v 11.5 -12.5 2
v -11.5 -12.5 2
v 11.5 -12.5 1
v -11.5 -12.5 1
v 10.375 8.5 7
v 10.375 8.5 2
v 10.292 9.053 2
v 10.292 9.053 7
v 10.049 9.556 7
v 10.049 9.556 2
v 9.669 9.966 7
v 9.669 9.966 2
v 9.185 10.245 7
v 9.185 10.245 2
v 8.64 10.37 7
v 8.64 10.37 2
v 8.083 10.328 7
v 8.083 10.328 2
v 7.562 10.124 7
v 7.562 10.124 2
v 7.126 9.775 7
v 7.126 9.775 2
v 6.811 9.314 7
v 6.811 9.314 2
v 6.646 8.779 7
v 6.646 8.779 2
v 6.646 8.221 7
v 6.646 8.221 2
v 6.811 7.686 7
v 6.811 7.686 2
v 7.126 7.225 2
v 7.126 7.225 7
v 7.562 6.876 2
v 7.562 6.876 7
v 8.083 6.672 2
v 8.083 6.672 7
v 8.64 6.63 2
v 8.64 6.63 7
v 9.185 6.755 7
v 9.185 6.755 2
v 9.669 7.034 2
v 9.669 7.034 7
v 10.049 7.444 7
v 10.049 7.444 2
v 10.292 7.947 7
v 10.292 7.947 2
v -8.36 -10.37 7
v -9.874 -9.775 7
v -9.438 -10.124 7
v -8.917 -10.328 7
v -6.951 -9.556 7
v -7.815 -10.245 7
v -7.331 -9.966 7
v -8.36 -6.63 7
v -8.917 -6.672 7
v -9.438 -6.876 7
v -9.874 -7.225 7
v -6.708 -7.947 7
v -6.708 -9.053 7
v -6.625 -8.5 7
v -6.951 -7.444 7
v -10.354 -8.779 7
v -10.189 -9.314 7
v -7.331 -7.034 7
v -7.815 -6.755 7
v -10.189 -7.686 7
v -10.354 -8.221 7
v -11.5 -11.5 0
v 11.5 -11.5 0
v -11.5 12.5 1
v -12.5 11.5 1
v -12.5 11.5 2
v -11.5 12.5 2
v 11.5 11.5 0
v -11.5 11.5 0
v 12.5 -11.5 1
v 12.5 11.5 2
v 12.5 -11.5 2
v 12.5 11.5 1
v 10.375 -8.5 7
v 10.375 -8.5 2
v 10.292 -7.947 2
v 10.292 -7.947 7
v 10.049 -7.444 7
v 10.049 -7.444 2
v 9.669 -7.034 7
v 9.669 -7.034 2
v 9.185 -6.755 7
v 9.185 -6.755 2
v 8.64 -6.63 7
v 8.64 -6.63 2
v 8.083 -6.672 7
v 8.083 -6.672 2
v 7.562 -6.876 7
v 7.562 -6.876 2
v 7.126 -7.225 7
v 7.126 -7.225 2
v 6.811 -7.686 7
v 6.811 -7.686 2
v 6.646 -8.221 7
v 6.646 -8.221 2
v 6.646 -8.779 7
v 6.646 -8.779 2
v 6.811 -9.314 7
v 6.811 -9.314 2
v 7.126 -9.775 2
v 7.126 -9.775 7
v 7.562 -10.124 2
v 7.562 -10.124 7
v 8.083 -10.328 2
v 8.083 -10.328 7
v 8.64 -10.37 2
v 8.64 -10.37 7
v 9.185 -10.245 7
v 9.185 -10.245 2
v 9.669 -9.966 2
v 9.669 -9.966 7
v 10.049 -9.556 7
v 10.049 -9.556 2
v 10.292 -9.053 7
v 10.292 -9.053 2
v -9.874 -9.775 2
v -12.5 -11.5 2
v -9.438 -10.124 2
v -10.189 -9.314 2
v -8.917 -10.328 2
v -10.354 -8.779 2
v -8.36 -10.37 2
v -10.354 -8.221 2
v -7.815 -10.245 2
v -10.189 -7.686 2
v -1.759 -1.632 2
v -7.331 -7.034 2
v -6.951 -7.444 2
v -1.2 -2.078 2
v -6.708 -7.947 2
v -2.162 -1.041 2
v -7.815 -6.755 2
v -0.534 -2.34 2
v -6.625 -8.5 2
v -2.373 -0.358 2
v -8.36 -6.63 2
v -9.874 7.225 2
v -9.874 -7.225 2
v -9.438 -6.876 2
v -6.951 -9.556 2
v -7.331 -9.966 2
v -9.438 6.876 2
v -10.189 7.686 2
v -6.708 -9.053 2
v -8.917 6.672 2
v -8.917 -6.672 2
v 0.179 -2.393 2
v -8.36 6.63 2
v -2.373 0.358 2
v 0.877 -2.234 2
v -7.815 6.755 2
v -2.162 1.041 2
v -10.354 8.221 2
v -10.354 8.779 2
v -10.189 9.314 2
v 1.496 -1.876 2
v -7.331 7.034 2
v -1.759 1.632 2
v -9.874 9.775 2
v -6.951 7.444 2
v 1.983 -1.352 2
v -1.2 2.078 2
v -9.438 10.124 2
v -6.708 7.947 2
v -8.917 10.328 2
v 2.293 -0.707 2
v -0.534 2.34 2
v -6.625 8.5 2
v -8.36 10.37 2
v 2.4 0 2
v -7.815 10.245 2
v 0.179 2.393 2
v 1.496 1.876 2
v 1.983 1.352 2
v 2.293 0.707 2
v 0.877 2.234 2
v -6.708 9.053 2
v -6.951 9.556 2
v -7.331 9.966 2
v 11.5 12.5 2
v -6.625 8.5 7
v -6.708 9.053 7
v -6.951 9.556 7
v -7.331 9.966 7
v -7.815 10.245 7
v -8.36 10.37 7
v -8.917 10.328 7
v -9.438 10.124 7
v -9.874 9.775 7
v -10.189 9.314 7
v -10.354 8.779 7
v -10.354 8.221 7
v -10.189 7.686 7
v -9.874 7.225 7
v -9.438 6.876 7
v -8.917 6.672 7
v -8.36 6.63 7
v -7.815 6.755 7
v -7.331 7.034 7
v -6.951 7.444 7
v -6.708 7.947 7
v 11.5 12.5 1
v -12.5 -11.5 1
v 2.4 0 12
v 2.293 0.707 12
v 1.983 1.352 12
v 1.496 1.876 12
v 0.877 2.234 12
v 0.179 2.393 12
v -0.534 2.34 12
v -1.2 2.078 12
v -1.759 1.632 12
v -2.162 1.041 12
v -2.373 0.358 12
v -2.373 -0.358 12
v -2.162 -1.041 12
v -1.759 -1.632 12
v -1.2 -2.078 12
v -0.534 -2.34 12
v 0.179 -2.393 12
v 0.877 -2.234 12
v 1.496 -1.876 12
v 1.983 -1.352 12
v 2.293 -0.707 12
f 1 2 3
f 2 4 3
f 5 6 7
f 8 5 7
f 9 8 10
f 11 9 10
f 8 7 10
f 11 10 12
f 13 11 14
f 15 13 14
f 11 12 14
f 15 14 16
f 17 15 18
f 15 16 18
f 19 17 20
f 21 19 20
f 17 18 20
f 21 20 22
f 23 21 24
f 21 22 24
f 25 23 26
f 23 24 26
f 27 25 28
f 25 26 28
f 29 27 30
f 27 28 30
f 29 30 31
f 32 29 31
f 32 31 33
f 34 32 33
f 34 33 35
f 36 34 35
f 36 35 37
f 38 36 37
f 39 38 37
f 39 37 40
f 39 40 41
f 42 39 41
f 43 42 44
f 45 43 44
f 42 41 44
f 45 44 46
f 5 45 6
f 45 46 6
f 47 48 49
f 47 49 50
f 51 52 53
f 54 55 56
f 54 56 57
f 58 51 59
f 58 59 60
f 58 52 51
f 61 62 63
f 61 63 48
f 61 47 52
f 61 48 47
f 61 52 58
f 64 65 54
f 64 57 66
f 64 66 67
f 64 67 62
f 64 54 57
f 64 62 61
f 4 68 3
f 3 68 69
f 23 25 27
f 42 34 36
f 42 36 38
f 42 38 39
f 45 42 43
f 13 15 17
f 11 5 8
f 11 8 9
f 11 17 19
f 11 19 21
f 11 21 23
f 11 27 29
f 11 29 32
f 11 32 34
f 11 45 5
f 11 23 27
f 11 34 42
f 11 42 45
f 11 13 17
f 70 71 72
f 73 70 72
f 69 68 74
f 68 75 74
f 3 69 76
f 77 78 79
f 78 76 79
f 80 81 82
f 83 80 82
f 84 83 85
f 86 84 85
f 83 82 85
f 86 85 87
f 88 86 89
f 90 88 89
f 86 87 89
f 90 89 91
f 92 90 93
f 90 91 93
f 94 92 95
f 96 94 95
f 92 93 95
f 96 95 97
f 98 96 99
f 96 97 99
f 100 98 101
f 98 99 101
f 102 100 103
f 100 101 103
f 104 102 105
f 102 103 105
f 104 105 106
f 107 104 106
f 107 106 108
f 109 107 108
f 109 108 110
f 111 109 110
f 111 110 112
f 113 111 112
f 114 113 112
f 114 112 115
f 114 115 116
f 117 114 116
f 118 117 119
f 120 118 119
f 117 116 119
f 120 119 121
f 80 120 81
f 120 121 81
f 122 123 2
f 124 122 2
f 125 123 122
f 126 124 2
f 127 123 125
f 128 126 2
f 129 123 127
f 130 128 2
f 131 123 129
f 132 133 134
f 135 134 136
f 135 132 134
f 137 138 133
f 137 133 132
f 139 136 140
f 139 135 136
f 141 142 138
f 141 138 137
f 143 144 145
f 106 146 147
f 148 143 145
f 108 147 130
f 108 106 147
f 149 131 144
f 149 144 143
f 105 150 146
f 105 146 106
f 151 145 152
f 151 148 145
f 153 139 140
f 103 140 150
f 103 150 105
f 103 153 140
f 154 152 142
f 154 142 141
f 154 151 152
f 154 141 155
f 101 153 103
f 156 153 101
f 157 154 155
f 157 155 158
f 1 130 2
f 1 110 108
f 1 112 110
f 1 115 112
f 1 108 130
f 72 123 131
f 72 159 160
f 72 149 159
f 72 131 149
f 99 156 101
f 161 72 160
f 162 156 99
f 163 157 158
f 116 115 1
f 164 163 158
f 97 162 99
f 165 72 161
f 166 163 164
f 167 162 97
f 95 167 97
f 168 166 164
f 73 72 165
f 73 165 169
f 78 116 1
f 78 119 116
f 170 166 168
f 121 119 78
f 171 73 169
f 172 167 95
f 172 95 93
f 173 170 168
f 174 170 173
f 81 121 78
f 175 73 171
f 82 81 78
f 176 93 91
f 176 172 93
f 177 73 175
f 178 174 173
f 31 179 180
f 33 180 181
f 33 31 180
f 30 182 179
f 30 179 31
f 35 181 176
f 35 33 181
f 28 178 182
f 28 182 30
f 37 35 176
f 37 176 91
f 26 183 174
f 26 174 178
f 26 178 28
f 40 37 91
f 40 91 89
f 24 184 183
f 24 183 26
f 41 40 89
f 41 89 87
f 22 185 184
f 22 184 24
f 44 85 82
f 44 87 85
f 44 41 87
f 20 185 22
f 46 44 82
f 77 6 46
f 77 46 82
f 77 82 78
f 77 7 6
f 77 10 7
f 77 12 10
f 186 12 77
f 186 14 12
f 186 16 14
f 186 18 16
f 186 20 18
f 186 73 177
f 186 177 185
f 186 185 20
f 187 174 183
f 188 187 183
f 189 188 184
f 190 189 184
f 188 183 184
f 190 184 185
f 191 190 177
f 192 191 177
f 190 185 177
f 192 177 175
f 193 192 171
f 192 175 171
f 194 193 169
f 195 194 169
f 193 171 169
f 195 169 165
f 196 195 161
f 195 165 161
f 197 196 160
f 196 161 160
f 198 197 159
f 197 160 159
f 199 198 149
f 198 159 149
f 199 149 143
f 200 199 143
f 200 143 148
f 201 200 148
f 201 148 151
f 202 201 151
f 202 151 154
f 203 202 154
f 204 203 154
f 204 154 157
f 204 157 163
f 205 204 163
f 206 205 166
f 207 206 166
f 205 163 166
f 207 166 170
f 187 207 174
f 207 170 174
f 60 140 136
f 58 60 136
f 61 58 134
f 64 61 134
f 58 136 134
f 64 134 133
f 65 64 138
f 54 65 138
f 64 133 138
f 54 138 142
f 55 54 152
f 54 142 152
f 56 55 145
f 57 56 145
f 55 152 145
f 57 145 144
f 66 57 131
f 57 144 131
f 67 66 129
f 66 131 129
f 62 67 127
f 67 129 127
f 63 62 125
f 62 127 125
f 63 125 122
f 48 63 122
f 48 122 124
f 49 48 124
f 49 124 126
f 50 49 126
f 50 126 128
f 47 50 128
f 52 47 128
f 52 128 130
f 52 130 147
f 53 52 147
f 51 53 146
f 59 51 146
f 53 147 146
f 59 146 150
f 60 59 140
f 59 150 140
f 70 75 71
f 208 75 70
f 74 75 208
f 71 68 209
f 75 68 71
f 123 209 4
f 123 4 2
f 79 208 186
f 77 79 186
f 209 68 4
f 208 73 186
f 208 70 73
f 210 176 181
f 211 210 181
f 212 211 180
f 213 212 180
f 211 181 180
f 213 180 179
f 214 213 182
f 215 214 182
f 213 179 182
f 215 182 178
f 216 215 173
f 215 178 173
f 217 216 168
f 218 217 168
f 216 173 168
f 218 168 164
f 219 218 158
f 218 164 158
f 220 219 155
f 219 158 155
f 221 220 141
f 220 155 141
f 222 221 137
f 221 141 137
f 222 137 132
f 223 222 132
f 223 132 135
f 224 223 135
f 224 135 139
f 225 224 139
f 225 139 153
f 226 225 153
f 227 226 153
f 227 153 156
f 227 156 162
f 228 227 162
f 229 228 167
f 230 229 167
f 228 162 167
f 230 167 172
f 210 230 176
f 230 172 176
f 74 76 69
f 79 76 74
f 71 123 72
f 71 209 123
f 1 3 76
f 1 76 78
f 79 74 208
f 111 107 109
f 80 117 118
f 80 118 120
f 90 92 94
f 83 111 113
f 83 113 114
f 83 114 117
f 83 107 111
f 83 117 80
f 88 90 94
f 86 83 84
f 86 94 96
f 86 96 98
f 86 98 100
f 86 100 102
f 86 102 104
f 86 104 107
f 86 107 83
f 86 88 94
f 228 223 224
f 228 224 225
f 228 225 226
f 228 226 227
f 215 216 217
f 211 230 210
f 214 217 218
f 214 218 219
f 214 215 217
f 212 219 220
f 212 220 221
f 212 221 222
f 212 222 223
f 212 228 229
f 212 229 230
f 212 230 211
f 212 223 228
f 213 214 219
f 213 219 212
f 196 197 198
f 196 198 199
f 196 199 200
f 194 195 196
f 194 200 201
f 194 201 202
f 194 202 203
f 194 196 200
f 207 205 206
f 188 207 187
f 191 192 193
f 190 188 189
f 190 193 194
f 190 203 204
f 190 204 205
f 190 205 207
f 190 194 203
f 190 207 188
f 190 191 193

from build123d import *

# Parameters (mm, degrees)
F0_W     = 25
F0_H     = 25
F1_DEPTH = 2
F2_R     = 2.4
F3_DEPTH = 10
F4_R     = 1.875
F5_DEPTH = 5
F6_SIZE  = 1


with BuildPart() as f1:
    # F0 (on Top) → F1 (new body)
    with BuildSketch(Plane.XY):
        Rectangle(F0_W, F0_H)
    extrude(amount=F1_DEPTH)

    # F2 (on face) → F3 (join)
    with BuildSketch(Plane.XY.offset(2)):
        Circle(F2_R)
    extrude(amount=F3_DEPTH)

    # F4 (on face) → F5 (join)
    with BuildSketch(Plane.XY.offset(2)):
        with Locations((-8.5, 8.5)):
            Circle(F4_R)
        with Locations((8.5, 8.5)):
            Circle(F4_R)
        with Locations((8.5, -8.5)):
            Circle(F4_R)
        with Locations((-8.5, -8.5)):
            Circle(F4_R)
    extrude(amount=F5_DEPTH)

    # F6
    f6_edges = [f1.edges().sort_by_distance(p)[0] for p in [
        (0, -12.5, 0),
        (12.5, 0, 0),
        (0, 12.5, 0),
        (-12.5, 0, 0),
        (-12.5, -12.5, 1),
        (12.5, -12.5, 1),
        (12.5, 12.5, 1),
        (-12.5, 12.5, 1),
    ]]
    chamfer(f6_edges, length=F6_SIZE)


solid = f1.part
